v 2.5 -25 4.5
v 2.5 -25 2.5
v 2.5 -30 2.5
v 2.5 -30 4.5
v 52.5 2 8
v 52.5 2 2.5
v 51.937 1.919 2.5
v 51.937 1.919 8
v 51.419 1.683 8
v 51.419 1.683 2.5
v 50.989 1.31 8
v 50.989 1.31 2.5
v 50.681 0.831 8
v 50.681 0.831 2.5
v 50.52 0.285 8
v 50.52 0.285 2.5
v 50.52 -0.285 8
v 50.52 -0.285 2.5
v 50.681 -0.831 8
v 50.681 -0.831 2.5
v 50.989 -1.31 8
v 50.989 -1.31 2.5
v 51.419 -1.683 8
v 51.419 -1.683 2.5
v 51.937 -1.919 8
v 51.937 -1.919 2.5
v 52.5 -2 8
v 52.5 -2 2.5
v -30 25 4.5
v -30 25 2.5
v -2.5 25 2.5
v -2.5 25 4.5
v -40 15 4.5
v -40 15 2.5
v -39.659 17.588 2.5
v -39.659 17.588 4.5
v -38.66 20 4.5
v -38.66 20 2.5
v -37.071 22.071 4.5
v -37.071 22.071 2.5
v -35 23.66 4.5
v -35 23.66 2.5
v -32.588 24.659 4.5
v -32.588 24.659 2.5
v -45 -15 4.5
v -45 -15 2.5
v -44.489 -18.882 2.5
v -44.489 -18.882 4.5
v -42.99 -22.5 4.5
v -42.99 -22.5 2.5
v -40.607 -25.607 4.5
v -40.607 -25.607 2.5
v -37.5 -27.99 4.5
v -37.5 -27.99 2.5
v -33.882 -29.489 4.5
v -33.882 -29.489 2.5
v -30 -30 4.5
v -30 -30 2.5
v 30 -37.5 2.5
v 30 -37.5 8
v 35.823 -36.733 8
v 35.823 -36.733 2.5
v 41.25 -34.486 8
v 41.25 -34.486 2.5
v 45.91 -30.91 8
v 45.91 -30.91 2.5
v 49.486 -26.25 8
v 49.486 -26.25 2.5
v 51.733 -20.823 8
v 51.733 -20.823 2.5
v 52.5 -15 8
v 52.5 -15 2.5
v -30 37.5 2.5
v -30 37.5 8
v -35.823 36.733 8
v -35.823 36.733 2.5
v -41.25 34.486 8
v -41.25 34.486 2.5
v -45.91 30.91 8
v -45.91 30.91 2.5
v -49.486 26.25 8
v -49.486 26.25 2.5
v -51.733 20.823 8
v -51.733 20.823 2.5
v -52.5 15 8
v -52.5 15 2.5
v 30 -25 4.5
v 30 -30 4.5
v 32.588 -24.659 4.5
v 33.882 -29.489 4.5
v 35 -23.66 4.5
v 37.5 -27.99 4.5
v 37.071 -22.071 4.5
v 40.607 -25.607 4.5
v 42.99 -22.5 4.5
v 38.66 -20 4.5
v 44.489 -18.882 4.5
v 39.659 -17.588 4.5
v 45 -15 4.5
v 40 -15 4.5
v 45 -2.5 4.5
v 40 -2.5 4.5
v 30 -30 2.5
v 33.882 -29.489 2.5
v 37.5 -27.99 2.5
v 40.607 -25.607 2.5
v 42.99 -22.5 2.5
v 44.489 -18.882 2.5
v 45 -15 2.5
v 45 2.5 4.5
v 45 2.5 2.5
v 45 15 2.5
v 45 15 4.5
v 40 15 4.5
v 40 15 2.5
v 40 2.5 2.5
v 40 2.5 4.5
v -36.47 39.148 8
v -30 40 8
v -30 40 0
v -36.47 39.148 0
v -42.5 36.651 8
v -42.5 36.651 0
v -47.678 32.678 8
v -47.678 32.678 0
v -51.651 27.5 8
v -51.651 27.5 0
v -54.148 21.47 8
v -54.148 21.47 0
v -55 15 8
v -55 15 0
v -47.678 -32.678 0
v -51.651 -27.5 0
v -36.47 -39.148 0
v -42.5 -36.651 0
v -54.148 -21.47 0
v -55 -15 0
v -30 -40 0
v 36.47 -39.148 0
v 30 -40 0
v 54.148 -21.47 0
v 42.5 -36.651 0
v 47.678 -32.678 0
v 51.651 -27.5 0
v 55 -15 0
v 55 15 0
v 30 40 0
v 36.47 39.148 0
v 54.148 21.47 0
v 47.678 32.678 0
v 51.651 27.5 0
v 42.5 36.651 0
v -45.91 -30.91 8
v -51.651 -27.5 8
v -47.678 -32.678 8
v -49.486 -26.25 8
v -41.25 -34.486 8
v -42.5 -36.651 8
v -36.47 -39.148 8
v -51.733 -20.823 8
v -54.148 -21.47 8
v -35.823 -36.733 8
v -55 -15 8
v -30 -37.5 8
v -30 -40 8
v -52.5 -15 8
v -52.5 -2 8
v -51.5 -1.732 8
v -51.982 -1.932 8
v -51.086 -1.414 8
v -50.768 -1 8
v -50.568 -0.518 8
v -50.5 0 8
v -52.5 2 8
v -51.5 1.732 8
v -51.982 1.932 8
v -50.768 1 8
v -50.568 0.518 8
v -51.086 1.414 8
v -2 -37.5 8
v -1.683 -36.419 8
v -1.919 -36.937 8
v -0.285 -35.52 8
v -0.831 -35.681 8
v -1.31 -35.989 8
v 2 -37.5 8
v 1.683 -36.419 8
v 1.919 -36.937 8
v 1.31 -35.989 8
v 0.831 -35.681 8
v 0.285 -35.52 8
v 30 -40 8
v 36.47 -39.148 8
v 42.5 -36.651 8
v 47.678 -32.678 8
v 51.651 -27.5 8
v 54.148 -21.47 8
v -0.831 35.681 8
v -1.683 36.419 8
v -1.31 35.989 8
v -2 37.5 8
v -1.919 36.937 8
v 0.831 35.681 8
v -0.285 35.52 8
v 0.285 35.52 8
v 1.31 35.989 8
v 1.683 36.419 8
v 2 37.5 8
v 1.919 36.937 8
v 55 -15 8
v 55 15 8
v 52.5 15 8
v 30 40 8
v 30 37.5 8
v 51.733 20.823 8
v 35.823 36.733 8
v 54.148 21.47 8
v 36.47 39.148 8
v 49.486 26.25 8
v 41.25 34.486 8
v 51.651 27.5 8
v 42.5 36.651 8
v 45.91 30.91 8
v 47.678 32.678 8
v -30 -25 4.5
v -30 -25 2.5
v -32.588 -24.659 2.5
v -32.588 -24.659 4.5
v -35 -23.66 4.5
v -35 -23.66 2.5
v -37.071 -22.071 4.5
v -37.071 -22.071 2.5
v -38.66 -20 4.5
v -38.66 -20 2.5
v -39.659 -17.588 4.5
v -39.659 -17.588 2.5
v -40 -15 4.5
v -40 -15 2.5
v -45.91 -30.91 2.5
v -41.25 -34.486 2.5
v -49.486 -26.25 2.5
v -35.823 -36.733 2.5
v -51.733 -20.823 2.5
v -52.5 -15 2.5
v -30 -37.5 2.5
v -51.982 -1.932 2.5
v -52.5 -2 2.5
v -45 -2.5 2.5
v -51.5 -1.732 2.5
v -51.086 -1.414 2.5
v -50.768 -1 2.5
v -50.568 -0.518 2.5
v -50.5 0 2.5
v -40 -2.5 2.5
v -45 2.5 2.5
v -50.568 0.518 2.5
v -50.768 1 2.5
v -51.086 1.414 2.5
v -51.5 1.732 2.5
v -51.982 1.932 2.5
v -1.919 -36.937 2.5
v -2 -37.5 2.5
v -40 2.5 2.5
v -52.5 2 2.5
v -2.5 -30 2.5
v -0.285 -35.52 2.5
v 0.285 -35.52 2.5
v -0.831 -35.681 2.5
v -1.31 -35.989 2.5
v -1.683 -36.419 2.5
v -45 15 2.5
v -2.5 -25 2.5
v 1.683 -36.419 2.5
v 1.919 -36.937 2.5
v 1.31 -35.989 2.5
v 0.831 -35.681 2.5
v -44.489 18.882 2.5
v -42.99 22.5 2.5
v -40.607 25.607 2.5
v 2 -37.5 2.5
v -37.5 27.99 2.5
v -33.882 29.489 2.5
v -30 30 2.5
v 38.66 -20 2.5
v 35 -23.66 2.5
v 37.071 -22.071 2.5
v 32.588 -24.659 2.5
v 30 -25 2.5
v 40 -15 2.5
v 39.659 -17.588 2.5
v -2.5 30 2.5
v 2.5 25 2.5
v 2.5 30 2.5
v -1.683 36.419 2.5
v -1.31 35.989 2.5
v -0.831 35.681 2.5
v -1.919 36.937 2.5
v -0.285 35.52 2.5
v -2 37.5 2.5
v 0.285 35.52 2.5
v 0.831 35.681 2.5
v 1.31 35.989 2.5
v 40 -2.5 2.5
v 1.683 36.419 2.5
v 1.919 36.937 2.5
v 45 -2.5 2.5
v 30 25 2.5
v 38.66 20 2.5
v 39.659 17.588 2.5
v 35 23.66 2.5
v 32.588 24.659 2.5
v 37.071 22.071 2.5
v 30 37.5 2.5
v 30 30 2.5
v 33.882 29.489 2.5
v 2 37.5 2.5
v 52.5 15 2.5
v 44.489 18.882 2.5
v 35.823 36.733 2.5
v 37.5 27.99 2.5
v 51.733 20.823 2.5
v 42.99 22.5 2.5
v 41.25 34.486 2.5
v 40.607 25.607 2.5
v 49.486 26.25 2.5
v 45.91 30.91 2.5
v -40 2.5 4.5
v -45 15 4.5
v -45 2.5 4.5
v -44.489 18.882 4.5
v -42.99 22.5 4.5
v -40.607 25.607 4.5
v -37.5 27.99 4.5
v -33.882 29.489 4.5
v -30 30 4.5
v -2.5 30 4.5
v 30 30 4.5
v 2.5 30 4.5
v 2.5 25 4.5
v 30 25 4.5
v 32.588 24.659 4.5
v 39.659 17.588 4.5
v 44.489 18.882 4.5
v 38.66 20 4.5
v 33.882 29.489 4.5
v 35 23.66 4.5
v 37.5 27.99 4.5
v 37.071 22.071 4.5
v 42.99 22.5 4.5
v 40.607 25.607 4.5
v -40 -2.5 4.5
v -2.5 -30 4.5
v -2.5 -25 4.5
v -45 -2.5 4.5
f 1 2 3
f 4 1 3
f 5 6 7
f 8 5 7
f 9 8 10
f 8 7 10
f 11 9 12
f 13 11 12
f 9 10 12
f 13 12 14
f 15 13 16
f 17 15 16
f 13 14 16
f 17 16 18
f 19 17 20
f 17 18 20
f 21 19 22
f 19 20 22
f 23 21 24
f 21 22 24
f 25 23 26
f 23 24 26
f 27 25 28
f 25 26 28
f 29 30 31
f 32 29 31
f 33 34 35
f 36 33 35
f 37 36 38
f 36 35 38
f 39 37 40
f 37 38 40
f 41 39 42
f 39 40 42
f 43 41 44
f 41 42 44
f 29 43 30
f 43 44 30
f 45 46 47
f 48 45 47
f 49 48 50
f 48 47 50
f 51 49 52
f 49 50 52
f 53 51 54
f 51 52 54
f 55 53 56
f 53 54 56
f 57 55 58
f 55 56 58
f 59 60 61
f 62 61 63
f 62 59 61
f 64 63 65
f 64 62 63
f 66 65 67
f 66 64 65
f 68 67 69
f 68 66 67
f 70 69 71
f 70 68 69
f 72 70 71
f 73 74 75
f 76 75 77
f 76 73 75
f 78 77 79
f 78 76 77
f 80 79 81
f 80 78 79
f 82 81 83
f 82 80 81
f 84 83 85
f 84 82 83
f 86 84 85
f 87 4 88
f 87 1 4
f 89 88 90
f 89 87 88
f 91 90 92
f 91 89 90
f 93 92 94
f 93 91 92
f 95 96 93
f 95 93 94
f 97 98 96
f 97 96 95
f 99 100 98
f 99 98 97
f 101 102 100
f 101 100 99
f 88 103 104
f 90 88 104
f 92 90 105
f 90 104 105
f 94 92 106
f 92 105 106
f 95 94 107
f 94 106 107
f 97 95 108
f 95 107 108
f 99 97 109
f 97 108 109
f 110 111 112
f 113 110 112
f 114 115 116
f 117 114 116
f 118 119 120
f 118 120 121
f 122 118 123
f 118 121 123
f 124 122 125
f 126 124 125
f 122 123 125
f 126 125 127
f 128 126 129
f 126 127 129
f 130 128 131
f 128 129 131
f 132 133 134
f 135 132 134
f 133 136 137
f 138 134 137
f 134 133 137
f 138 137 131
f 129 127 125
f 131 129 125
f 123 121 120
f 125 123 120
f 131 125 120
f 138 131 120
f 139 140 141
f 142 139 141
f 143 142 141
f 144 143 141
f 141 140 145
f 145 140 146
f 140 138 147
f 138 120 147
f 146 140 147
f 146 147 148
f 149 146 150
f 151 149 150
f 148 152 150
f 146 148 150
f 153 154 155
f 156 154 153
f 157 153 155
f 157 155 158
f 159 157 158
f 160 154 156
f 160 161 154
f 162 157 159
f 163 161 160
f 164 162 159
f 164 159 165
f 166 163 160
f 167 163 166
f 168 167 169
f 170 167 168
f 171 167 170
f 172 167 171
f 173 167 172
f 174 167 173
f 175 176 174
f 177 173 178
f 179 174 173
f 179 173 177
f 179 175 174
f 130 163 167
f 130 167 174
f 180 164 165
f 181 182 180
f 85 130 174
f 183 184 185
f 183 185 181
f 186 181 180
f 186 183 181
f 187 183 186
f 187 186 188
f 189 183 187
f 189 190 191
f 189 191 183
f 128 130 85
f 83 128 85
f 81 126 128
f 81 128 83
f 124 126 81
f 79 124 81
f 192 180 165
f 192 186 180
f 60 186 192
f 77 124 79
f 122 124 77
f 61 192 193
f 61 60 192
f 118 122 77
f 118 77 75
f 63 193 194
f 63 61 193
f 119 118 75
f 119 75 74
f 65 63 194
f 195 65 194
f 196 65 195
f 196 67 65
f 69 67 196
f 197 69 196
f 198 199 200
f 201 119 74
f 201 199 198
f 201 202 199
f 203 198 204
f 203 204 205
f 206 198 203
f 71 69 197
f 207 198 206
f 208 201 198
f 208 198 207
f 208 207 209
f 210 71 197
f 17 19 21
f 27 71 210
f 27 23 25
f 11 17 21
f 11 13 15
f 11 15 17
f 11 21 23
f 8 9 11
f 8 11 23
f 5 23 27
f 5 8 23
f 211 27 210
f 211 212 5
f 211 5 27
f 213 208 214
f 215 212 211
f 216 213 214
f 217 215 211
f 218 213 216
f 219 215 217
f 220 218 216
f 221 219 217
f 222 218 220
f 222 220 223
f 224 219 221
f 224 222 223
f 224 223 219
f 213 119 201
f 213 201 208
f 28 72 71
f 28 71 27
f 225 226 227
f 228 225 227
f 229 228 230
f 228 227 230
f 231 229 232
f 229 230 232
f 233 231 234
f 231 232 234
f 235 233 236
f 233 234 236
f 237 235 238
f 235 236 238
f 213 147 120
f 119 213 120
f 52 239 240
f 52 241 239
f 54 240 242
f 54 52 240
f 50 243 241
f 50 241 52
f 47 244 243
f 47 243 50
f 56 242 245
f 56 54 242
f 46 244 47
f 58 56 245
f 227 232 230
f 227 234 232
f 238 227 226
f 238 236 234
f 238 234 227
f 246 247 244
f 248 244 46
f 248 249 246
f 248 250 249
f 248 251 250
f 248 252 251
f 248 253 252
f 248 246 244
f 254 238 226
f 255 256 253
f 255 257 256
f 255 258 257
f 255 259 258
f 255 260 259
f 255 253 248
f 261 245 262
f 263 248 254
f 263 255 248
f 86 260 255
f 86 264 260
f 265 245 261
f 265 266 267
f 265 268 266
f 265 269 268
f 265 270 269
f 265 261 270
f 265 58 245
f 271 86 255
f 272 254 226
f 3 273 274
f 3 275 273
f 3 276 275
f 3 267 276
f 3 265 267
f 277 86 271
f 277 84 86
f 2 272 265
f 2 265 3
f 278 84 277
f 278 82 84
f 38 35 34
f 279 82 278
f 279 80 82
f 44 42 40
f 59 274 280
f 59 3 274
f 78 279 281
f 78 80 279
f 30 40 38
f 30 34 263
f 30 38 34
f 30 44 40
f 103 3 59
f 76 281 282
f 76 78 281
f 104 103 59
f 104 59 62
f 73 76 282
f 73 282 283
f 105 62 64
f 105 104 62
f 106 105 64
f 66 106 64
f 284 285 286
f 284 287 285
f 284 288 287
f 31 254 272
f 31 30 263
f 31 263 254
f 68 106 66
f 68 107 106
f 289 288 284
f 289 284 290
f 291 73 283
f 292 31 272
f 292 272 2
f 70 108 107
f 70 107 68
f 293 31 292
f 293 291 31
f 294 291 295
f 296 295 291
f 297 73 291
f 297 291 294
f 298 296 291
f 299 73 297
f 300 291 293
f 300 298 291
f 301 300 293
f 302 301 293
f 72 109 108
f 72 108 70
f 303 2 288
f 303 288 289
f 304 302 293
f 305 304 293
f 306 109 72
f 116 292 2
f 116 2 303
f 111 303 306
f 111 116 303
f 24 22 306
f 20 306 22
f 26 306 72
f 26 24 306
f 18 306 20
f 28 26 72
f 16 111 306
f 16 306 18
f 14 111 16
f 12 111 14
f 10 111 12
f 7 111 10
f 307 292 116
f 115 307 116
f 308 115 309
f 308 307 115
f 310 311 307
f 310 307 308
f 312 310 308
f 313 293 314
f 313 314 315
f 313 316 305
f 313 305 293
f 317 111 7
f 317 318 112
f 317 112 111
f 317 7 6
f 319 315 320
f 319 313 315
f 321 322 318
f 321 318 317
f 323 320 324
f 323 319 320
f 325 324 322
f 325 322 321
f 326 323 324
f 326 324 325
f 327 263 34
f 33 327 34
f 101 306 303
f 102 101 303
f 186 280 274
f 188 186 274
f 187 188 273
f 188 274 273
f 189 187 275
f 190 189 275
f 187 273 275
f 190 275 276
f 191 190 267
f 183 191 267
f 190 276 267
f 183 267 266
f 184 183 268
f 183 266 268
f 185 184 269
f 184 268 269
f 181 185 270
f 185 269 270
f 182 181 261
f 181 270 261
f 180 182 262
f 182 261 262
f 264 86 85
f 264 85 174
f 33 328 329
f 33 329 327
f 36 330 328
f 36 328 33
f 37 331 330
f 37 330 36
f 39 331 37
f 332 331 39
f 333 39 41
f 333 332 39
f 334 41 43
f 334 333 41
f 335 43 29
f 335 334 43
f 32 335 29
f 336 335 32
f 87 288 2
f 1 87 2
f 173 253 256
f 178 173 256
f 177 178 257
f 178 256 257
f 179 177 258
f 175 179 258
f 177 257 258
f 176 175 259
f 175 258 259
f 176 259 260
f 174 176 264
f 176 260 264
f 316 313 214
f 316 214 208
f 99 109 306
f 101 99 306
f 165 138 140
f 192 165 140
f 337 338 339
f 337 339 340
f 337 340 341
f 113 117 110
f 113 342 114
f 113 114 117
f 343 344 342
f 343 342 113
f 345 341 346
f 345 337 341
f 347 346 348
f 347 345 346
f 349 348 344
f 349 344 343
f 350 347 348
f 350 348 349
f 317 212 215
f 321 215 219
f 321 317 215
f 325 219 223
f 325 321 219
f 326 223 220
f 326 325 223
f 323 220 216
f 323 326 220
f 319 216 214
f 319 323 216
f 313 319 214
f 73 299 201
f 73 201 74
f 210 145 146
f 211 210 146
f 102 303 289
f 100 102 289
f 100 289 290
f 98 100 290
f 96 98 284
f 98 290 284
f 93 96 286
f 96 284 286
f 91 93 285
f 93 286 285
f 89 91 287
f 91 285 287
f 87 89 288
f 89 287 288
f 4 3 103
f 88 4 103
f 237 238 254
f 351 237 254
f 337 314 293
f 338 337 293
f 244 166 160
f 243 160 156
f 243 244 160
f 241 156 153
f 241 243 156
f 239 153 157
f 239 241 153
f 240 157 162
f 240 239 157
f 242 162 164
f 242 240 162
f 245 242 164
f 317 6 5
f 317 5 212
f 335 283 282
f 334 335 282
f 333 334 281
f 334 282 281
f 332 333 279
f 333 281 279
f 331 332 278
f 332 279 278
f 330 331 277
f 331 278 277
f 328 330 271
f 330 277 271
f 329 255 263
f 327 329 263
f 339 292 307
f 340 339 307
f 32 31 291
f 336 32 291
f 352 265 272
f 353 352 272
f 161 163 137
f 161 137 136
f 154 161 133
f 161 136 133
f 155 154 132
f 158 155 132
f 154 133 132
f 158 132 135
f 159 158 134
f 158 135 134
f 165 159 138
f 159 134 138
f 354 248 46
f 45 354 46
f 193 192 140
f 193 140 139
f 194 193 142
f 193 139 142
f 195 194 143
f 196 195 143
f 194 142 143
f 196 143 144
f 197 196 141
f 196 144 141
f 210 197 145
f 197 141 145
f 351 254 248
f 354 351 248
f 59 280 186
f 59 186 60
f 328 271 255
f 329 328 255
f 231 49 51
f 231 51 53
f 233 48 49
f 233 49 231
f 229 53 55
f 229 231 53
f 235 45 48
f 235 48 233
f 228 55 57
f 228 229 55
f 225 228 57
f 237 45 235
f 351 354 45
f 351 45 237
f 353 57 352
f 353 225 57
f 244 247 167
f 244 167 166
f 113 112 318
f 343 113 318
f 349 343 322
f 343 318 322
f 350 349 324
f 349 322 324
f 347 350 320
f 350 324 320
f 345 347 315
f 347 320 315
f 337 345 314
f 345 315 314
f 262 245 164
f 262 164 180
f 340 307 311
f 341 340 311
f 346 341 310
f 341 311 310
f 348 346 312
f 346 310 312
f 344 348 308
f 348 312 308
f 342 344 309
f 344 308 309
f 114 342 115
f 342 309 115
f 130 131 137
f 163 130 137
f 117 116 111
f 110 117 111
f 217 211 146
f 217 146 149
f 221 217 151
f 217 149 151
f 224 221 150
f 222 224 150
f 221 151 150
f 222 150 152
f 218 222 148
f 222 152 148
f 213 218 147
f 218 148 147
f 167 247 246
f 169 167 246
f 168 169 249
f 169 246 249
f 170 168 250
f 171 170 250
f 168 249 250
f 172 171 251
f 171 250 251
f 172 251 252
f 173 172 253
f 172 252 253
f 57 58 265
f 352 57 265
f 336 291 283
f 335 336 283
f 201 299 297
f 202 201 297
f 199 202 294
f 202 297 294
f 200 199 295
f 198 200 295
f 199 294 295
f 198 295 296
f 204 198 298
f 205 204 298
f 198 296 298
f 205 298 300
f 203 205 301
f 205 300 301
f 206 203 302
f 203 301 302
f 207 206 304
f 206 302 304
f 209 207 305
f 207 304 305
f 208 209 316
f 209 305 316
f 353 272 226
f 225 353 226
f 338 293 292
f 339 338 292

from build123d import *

# Parameters (mm, degrees)
F1_DEPTH = 8
F2_T     = -2.5
F4_DEPTH = 2
F6_DEPTH = 5.5


with BuildPart() as f1:
    # F0 (on Top) → F1 (new body)
    with BuildSketch(Plane.XY):
        with BuildLine():
            Line((-30, -40), (30, -40))
            ThreePointArc((30, -40), (47.6776695297, -32.6776695297), (55, -15))
            Line((55, -15), (55, 15))
            ThreePointArc((55, 15), (47.6776695297, 32.6776695297), (30, 40))
            Line((30, 40), (-30, 40))
            ThreePointArc((-30, 40), (-47.6776695297, 32.6776695297), (-55, 15))
            Line((-55, 15), (-55, -15))
            ThreePointArc((-55, -15), (-47.6776695297, -32.6776695297), (-30, -40))
        make_face()
    extrude(amount=F1_DEPTH)

    # F2
    f2_openings = [f1.faces().sort_by_distance(p)[0] for p in [
        (0, 0, 8),
    ]]
    offset(amount=F2_T, openings=f2_openings)

    # F3 (on face) → F4 (join)
    with BuildSketch(Plane.XY.offset(2.5)):
        with BuildLine():
            Line((-45, 15), (-45, 2.5))
            Line((-45, 2.5), (-40, 2.5))
            Line((-40, 2.5), (-40, 15))
            ThreePointArc((-40, 15), (-37.0710678119, 22.0710678119), (-30, 25))
            Line((-30, 25), (-2.5, 25))
            Line((-2.5, 25), (-2.5, 30))
            Line((-2.5, 30), (-30, 30))
            ThreePointArc((-30, 30), (-40.6066017178, 25.6066017178), (-45, 15))
        make_face()
        with BuildLine():
            Line((40, 2.5), (45, 2.5))
            Line((45, 2.5), (45, 15))
            ThreePointArc((45, 15), (40.6066017178, 25.6066017178), (30, 30))
            Line((30, 30), (2.5, 30))
            Line((2.5, 30), (2.5, 25))
            Line((2.5, 25), (30, 25))
            ThreePointArc((30, 25), (37.0710678119, 22.0710678119), (40, 15))
            Line((40, 15), (40, 2.5))
        make_face()
        with BuildLine():
            Line((2.5, -30), (30, -30))
            ThreePointArc((30, -30), (40.6066017178, -25.6066017178), (45, -15))
            Line((45, -15), (45, -2.5))
            Line((45, -2.5), (40, -2.5))
            Line((40, -2.5), (40, -15))
            ThreePointArc((40, -15), (37.0710678119, -22.0710678119), (30, -25))
            Line((30, -25), (2.5, -25))
            Line((2.5, -25), (2.5, -30))
        make_face()
        with BuildLine():
            Line((-30, -30), (-2.5, -30))
            Line((-2.5, -30), (-2.5, -25))
            Line((-2.5, -25), (-30, -25))
            ThreePointArc((-30, -25), (-37.0710678119, -22.0710678119), (-40, -15))
            Line((-40, -15), (-40, -2.5))
            Line((-40, -2.5), (-45, -2.5))
            Line((-45, -2.5), (-45, -15))
            ThreePointArc((-45, -15), (-40.6066017178, -25.6066017178), (-30, -30))
        make_face()
    extrude(amount=F4_DEPTH)

    # F5 (on face) → F6 (join, through all)
    with BuildSketch(Plane.XY.offset(2.5)):
        with BuildLine():
            ThreePointArc((-2, 37.5), (0, 35.5), (2, 37.5))
            Line((2, 37.5), (-2, 37.5))
        make_face()
        with BuildLine():
            Line((52.5, -2), (52.5, 2))
            ThreePointArc((52.5, 2), (50.5, 0), (52.5, -2))
        make_face()
        with BuildLine():
            Line((-2, -37.5), (2, -37.5))
            ThreePointArc((2, -37.5), (0, -35.5), (-2, -37.5))
        make_face()
        with BuildLine():
            ThreePointArc((-50.5, 0), (-51.0857864376, 1.4142135624), (-52.5, 2))
            Line((-52.5, 2), (-52.5, -2))
            ThreePointArc((-52.5, -2), (-51.0857864376, -1.4142135624), (-50.5, 0))
        make_face()
    extrude(amount=F6_DEPTH)


solid = f1.part
